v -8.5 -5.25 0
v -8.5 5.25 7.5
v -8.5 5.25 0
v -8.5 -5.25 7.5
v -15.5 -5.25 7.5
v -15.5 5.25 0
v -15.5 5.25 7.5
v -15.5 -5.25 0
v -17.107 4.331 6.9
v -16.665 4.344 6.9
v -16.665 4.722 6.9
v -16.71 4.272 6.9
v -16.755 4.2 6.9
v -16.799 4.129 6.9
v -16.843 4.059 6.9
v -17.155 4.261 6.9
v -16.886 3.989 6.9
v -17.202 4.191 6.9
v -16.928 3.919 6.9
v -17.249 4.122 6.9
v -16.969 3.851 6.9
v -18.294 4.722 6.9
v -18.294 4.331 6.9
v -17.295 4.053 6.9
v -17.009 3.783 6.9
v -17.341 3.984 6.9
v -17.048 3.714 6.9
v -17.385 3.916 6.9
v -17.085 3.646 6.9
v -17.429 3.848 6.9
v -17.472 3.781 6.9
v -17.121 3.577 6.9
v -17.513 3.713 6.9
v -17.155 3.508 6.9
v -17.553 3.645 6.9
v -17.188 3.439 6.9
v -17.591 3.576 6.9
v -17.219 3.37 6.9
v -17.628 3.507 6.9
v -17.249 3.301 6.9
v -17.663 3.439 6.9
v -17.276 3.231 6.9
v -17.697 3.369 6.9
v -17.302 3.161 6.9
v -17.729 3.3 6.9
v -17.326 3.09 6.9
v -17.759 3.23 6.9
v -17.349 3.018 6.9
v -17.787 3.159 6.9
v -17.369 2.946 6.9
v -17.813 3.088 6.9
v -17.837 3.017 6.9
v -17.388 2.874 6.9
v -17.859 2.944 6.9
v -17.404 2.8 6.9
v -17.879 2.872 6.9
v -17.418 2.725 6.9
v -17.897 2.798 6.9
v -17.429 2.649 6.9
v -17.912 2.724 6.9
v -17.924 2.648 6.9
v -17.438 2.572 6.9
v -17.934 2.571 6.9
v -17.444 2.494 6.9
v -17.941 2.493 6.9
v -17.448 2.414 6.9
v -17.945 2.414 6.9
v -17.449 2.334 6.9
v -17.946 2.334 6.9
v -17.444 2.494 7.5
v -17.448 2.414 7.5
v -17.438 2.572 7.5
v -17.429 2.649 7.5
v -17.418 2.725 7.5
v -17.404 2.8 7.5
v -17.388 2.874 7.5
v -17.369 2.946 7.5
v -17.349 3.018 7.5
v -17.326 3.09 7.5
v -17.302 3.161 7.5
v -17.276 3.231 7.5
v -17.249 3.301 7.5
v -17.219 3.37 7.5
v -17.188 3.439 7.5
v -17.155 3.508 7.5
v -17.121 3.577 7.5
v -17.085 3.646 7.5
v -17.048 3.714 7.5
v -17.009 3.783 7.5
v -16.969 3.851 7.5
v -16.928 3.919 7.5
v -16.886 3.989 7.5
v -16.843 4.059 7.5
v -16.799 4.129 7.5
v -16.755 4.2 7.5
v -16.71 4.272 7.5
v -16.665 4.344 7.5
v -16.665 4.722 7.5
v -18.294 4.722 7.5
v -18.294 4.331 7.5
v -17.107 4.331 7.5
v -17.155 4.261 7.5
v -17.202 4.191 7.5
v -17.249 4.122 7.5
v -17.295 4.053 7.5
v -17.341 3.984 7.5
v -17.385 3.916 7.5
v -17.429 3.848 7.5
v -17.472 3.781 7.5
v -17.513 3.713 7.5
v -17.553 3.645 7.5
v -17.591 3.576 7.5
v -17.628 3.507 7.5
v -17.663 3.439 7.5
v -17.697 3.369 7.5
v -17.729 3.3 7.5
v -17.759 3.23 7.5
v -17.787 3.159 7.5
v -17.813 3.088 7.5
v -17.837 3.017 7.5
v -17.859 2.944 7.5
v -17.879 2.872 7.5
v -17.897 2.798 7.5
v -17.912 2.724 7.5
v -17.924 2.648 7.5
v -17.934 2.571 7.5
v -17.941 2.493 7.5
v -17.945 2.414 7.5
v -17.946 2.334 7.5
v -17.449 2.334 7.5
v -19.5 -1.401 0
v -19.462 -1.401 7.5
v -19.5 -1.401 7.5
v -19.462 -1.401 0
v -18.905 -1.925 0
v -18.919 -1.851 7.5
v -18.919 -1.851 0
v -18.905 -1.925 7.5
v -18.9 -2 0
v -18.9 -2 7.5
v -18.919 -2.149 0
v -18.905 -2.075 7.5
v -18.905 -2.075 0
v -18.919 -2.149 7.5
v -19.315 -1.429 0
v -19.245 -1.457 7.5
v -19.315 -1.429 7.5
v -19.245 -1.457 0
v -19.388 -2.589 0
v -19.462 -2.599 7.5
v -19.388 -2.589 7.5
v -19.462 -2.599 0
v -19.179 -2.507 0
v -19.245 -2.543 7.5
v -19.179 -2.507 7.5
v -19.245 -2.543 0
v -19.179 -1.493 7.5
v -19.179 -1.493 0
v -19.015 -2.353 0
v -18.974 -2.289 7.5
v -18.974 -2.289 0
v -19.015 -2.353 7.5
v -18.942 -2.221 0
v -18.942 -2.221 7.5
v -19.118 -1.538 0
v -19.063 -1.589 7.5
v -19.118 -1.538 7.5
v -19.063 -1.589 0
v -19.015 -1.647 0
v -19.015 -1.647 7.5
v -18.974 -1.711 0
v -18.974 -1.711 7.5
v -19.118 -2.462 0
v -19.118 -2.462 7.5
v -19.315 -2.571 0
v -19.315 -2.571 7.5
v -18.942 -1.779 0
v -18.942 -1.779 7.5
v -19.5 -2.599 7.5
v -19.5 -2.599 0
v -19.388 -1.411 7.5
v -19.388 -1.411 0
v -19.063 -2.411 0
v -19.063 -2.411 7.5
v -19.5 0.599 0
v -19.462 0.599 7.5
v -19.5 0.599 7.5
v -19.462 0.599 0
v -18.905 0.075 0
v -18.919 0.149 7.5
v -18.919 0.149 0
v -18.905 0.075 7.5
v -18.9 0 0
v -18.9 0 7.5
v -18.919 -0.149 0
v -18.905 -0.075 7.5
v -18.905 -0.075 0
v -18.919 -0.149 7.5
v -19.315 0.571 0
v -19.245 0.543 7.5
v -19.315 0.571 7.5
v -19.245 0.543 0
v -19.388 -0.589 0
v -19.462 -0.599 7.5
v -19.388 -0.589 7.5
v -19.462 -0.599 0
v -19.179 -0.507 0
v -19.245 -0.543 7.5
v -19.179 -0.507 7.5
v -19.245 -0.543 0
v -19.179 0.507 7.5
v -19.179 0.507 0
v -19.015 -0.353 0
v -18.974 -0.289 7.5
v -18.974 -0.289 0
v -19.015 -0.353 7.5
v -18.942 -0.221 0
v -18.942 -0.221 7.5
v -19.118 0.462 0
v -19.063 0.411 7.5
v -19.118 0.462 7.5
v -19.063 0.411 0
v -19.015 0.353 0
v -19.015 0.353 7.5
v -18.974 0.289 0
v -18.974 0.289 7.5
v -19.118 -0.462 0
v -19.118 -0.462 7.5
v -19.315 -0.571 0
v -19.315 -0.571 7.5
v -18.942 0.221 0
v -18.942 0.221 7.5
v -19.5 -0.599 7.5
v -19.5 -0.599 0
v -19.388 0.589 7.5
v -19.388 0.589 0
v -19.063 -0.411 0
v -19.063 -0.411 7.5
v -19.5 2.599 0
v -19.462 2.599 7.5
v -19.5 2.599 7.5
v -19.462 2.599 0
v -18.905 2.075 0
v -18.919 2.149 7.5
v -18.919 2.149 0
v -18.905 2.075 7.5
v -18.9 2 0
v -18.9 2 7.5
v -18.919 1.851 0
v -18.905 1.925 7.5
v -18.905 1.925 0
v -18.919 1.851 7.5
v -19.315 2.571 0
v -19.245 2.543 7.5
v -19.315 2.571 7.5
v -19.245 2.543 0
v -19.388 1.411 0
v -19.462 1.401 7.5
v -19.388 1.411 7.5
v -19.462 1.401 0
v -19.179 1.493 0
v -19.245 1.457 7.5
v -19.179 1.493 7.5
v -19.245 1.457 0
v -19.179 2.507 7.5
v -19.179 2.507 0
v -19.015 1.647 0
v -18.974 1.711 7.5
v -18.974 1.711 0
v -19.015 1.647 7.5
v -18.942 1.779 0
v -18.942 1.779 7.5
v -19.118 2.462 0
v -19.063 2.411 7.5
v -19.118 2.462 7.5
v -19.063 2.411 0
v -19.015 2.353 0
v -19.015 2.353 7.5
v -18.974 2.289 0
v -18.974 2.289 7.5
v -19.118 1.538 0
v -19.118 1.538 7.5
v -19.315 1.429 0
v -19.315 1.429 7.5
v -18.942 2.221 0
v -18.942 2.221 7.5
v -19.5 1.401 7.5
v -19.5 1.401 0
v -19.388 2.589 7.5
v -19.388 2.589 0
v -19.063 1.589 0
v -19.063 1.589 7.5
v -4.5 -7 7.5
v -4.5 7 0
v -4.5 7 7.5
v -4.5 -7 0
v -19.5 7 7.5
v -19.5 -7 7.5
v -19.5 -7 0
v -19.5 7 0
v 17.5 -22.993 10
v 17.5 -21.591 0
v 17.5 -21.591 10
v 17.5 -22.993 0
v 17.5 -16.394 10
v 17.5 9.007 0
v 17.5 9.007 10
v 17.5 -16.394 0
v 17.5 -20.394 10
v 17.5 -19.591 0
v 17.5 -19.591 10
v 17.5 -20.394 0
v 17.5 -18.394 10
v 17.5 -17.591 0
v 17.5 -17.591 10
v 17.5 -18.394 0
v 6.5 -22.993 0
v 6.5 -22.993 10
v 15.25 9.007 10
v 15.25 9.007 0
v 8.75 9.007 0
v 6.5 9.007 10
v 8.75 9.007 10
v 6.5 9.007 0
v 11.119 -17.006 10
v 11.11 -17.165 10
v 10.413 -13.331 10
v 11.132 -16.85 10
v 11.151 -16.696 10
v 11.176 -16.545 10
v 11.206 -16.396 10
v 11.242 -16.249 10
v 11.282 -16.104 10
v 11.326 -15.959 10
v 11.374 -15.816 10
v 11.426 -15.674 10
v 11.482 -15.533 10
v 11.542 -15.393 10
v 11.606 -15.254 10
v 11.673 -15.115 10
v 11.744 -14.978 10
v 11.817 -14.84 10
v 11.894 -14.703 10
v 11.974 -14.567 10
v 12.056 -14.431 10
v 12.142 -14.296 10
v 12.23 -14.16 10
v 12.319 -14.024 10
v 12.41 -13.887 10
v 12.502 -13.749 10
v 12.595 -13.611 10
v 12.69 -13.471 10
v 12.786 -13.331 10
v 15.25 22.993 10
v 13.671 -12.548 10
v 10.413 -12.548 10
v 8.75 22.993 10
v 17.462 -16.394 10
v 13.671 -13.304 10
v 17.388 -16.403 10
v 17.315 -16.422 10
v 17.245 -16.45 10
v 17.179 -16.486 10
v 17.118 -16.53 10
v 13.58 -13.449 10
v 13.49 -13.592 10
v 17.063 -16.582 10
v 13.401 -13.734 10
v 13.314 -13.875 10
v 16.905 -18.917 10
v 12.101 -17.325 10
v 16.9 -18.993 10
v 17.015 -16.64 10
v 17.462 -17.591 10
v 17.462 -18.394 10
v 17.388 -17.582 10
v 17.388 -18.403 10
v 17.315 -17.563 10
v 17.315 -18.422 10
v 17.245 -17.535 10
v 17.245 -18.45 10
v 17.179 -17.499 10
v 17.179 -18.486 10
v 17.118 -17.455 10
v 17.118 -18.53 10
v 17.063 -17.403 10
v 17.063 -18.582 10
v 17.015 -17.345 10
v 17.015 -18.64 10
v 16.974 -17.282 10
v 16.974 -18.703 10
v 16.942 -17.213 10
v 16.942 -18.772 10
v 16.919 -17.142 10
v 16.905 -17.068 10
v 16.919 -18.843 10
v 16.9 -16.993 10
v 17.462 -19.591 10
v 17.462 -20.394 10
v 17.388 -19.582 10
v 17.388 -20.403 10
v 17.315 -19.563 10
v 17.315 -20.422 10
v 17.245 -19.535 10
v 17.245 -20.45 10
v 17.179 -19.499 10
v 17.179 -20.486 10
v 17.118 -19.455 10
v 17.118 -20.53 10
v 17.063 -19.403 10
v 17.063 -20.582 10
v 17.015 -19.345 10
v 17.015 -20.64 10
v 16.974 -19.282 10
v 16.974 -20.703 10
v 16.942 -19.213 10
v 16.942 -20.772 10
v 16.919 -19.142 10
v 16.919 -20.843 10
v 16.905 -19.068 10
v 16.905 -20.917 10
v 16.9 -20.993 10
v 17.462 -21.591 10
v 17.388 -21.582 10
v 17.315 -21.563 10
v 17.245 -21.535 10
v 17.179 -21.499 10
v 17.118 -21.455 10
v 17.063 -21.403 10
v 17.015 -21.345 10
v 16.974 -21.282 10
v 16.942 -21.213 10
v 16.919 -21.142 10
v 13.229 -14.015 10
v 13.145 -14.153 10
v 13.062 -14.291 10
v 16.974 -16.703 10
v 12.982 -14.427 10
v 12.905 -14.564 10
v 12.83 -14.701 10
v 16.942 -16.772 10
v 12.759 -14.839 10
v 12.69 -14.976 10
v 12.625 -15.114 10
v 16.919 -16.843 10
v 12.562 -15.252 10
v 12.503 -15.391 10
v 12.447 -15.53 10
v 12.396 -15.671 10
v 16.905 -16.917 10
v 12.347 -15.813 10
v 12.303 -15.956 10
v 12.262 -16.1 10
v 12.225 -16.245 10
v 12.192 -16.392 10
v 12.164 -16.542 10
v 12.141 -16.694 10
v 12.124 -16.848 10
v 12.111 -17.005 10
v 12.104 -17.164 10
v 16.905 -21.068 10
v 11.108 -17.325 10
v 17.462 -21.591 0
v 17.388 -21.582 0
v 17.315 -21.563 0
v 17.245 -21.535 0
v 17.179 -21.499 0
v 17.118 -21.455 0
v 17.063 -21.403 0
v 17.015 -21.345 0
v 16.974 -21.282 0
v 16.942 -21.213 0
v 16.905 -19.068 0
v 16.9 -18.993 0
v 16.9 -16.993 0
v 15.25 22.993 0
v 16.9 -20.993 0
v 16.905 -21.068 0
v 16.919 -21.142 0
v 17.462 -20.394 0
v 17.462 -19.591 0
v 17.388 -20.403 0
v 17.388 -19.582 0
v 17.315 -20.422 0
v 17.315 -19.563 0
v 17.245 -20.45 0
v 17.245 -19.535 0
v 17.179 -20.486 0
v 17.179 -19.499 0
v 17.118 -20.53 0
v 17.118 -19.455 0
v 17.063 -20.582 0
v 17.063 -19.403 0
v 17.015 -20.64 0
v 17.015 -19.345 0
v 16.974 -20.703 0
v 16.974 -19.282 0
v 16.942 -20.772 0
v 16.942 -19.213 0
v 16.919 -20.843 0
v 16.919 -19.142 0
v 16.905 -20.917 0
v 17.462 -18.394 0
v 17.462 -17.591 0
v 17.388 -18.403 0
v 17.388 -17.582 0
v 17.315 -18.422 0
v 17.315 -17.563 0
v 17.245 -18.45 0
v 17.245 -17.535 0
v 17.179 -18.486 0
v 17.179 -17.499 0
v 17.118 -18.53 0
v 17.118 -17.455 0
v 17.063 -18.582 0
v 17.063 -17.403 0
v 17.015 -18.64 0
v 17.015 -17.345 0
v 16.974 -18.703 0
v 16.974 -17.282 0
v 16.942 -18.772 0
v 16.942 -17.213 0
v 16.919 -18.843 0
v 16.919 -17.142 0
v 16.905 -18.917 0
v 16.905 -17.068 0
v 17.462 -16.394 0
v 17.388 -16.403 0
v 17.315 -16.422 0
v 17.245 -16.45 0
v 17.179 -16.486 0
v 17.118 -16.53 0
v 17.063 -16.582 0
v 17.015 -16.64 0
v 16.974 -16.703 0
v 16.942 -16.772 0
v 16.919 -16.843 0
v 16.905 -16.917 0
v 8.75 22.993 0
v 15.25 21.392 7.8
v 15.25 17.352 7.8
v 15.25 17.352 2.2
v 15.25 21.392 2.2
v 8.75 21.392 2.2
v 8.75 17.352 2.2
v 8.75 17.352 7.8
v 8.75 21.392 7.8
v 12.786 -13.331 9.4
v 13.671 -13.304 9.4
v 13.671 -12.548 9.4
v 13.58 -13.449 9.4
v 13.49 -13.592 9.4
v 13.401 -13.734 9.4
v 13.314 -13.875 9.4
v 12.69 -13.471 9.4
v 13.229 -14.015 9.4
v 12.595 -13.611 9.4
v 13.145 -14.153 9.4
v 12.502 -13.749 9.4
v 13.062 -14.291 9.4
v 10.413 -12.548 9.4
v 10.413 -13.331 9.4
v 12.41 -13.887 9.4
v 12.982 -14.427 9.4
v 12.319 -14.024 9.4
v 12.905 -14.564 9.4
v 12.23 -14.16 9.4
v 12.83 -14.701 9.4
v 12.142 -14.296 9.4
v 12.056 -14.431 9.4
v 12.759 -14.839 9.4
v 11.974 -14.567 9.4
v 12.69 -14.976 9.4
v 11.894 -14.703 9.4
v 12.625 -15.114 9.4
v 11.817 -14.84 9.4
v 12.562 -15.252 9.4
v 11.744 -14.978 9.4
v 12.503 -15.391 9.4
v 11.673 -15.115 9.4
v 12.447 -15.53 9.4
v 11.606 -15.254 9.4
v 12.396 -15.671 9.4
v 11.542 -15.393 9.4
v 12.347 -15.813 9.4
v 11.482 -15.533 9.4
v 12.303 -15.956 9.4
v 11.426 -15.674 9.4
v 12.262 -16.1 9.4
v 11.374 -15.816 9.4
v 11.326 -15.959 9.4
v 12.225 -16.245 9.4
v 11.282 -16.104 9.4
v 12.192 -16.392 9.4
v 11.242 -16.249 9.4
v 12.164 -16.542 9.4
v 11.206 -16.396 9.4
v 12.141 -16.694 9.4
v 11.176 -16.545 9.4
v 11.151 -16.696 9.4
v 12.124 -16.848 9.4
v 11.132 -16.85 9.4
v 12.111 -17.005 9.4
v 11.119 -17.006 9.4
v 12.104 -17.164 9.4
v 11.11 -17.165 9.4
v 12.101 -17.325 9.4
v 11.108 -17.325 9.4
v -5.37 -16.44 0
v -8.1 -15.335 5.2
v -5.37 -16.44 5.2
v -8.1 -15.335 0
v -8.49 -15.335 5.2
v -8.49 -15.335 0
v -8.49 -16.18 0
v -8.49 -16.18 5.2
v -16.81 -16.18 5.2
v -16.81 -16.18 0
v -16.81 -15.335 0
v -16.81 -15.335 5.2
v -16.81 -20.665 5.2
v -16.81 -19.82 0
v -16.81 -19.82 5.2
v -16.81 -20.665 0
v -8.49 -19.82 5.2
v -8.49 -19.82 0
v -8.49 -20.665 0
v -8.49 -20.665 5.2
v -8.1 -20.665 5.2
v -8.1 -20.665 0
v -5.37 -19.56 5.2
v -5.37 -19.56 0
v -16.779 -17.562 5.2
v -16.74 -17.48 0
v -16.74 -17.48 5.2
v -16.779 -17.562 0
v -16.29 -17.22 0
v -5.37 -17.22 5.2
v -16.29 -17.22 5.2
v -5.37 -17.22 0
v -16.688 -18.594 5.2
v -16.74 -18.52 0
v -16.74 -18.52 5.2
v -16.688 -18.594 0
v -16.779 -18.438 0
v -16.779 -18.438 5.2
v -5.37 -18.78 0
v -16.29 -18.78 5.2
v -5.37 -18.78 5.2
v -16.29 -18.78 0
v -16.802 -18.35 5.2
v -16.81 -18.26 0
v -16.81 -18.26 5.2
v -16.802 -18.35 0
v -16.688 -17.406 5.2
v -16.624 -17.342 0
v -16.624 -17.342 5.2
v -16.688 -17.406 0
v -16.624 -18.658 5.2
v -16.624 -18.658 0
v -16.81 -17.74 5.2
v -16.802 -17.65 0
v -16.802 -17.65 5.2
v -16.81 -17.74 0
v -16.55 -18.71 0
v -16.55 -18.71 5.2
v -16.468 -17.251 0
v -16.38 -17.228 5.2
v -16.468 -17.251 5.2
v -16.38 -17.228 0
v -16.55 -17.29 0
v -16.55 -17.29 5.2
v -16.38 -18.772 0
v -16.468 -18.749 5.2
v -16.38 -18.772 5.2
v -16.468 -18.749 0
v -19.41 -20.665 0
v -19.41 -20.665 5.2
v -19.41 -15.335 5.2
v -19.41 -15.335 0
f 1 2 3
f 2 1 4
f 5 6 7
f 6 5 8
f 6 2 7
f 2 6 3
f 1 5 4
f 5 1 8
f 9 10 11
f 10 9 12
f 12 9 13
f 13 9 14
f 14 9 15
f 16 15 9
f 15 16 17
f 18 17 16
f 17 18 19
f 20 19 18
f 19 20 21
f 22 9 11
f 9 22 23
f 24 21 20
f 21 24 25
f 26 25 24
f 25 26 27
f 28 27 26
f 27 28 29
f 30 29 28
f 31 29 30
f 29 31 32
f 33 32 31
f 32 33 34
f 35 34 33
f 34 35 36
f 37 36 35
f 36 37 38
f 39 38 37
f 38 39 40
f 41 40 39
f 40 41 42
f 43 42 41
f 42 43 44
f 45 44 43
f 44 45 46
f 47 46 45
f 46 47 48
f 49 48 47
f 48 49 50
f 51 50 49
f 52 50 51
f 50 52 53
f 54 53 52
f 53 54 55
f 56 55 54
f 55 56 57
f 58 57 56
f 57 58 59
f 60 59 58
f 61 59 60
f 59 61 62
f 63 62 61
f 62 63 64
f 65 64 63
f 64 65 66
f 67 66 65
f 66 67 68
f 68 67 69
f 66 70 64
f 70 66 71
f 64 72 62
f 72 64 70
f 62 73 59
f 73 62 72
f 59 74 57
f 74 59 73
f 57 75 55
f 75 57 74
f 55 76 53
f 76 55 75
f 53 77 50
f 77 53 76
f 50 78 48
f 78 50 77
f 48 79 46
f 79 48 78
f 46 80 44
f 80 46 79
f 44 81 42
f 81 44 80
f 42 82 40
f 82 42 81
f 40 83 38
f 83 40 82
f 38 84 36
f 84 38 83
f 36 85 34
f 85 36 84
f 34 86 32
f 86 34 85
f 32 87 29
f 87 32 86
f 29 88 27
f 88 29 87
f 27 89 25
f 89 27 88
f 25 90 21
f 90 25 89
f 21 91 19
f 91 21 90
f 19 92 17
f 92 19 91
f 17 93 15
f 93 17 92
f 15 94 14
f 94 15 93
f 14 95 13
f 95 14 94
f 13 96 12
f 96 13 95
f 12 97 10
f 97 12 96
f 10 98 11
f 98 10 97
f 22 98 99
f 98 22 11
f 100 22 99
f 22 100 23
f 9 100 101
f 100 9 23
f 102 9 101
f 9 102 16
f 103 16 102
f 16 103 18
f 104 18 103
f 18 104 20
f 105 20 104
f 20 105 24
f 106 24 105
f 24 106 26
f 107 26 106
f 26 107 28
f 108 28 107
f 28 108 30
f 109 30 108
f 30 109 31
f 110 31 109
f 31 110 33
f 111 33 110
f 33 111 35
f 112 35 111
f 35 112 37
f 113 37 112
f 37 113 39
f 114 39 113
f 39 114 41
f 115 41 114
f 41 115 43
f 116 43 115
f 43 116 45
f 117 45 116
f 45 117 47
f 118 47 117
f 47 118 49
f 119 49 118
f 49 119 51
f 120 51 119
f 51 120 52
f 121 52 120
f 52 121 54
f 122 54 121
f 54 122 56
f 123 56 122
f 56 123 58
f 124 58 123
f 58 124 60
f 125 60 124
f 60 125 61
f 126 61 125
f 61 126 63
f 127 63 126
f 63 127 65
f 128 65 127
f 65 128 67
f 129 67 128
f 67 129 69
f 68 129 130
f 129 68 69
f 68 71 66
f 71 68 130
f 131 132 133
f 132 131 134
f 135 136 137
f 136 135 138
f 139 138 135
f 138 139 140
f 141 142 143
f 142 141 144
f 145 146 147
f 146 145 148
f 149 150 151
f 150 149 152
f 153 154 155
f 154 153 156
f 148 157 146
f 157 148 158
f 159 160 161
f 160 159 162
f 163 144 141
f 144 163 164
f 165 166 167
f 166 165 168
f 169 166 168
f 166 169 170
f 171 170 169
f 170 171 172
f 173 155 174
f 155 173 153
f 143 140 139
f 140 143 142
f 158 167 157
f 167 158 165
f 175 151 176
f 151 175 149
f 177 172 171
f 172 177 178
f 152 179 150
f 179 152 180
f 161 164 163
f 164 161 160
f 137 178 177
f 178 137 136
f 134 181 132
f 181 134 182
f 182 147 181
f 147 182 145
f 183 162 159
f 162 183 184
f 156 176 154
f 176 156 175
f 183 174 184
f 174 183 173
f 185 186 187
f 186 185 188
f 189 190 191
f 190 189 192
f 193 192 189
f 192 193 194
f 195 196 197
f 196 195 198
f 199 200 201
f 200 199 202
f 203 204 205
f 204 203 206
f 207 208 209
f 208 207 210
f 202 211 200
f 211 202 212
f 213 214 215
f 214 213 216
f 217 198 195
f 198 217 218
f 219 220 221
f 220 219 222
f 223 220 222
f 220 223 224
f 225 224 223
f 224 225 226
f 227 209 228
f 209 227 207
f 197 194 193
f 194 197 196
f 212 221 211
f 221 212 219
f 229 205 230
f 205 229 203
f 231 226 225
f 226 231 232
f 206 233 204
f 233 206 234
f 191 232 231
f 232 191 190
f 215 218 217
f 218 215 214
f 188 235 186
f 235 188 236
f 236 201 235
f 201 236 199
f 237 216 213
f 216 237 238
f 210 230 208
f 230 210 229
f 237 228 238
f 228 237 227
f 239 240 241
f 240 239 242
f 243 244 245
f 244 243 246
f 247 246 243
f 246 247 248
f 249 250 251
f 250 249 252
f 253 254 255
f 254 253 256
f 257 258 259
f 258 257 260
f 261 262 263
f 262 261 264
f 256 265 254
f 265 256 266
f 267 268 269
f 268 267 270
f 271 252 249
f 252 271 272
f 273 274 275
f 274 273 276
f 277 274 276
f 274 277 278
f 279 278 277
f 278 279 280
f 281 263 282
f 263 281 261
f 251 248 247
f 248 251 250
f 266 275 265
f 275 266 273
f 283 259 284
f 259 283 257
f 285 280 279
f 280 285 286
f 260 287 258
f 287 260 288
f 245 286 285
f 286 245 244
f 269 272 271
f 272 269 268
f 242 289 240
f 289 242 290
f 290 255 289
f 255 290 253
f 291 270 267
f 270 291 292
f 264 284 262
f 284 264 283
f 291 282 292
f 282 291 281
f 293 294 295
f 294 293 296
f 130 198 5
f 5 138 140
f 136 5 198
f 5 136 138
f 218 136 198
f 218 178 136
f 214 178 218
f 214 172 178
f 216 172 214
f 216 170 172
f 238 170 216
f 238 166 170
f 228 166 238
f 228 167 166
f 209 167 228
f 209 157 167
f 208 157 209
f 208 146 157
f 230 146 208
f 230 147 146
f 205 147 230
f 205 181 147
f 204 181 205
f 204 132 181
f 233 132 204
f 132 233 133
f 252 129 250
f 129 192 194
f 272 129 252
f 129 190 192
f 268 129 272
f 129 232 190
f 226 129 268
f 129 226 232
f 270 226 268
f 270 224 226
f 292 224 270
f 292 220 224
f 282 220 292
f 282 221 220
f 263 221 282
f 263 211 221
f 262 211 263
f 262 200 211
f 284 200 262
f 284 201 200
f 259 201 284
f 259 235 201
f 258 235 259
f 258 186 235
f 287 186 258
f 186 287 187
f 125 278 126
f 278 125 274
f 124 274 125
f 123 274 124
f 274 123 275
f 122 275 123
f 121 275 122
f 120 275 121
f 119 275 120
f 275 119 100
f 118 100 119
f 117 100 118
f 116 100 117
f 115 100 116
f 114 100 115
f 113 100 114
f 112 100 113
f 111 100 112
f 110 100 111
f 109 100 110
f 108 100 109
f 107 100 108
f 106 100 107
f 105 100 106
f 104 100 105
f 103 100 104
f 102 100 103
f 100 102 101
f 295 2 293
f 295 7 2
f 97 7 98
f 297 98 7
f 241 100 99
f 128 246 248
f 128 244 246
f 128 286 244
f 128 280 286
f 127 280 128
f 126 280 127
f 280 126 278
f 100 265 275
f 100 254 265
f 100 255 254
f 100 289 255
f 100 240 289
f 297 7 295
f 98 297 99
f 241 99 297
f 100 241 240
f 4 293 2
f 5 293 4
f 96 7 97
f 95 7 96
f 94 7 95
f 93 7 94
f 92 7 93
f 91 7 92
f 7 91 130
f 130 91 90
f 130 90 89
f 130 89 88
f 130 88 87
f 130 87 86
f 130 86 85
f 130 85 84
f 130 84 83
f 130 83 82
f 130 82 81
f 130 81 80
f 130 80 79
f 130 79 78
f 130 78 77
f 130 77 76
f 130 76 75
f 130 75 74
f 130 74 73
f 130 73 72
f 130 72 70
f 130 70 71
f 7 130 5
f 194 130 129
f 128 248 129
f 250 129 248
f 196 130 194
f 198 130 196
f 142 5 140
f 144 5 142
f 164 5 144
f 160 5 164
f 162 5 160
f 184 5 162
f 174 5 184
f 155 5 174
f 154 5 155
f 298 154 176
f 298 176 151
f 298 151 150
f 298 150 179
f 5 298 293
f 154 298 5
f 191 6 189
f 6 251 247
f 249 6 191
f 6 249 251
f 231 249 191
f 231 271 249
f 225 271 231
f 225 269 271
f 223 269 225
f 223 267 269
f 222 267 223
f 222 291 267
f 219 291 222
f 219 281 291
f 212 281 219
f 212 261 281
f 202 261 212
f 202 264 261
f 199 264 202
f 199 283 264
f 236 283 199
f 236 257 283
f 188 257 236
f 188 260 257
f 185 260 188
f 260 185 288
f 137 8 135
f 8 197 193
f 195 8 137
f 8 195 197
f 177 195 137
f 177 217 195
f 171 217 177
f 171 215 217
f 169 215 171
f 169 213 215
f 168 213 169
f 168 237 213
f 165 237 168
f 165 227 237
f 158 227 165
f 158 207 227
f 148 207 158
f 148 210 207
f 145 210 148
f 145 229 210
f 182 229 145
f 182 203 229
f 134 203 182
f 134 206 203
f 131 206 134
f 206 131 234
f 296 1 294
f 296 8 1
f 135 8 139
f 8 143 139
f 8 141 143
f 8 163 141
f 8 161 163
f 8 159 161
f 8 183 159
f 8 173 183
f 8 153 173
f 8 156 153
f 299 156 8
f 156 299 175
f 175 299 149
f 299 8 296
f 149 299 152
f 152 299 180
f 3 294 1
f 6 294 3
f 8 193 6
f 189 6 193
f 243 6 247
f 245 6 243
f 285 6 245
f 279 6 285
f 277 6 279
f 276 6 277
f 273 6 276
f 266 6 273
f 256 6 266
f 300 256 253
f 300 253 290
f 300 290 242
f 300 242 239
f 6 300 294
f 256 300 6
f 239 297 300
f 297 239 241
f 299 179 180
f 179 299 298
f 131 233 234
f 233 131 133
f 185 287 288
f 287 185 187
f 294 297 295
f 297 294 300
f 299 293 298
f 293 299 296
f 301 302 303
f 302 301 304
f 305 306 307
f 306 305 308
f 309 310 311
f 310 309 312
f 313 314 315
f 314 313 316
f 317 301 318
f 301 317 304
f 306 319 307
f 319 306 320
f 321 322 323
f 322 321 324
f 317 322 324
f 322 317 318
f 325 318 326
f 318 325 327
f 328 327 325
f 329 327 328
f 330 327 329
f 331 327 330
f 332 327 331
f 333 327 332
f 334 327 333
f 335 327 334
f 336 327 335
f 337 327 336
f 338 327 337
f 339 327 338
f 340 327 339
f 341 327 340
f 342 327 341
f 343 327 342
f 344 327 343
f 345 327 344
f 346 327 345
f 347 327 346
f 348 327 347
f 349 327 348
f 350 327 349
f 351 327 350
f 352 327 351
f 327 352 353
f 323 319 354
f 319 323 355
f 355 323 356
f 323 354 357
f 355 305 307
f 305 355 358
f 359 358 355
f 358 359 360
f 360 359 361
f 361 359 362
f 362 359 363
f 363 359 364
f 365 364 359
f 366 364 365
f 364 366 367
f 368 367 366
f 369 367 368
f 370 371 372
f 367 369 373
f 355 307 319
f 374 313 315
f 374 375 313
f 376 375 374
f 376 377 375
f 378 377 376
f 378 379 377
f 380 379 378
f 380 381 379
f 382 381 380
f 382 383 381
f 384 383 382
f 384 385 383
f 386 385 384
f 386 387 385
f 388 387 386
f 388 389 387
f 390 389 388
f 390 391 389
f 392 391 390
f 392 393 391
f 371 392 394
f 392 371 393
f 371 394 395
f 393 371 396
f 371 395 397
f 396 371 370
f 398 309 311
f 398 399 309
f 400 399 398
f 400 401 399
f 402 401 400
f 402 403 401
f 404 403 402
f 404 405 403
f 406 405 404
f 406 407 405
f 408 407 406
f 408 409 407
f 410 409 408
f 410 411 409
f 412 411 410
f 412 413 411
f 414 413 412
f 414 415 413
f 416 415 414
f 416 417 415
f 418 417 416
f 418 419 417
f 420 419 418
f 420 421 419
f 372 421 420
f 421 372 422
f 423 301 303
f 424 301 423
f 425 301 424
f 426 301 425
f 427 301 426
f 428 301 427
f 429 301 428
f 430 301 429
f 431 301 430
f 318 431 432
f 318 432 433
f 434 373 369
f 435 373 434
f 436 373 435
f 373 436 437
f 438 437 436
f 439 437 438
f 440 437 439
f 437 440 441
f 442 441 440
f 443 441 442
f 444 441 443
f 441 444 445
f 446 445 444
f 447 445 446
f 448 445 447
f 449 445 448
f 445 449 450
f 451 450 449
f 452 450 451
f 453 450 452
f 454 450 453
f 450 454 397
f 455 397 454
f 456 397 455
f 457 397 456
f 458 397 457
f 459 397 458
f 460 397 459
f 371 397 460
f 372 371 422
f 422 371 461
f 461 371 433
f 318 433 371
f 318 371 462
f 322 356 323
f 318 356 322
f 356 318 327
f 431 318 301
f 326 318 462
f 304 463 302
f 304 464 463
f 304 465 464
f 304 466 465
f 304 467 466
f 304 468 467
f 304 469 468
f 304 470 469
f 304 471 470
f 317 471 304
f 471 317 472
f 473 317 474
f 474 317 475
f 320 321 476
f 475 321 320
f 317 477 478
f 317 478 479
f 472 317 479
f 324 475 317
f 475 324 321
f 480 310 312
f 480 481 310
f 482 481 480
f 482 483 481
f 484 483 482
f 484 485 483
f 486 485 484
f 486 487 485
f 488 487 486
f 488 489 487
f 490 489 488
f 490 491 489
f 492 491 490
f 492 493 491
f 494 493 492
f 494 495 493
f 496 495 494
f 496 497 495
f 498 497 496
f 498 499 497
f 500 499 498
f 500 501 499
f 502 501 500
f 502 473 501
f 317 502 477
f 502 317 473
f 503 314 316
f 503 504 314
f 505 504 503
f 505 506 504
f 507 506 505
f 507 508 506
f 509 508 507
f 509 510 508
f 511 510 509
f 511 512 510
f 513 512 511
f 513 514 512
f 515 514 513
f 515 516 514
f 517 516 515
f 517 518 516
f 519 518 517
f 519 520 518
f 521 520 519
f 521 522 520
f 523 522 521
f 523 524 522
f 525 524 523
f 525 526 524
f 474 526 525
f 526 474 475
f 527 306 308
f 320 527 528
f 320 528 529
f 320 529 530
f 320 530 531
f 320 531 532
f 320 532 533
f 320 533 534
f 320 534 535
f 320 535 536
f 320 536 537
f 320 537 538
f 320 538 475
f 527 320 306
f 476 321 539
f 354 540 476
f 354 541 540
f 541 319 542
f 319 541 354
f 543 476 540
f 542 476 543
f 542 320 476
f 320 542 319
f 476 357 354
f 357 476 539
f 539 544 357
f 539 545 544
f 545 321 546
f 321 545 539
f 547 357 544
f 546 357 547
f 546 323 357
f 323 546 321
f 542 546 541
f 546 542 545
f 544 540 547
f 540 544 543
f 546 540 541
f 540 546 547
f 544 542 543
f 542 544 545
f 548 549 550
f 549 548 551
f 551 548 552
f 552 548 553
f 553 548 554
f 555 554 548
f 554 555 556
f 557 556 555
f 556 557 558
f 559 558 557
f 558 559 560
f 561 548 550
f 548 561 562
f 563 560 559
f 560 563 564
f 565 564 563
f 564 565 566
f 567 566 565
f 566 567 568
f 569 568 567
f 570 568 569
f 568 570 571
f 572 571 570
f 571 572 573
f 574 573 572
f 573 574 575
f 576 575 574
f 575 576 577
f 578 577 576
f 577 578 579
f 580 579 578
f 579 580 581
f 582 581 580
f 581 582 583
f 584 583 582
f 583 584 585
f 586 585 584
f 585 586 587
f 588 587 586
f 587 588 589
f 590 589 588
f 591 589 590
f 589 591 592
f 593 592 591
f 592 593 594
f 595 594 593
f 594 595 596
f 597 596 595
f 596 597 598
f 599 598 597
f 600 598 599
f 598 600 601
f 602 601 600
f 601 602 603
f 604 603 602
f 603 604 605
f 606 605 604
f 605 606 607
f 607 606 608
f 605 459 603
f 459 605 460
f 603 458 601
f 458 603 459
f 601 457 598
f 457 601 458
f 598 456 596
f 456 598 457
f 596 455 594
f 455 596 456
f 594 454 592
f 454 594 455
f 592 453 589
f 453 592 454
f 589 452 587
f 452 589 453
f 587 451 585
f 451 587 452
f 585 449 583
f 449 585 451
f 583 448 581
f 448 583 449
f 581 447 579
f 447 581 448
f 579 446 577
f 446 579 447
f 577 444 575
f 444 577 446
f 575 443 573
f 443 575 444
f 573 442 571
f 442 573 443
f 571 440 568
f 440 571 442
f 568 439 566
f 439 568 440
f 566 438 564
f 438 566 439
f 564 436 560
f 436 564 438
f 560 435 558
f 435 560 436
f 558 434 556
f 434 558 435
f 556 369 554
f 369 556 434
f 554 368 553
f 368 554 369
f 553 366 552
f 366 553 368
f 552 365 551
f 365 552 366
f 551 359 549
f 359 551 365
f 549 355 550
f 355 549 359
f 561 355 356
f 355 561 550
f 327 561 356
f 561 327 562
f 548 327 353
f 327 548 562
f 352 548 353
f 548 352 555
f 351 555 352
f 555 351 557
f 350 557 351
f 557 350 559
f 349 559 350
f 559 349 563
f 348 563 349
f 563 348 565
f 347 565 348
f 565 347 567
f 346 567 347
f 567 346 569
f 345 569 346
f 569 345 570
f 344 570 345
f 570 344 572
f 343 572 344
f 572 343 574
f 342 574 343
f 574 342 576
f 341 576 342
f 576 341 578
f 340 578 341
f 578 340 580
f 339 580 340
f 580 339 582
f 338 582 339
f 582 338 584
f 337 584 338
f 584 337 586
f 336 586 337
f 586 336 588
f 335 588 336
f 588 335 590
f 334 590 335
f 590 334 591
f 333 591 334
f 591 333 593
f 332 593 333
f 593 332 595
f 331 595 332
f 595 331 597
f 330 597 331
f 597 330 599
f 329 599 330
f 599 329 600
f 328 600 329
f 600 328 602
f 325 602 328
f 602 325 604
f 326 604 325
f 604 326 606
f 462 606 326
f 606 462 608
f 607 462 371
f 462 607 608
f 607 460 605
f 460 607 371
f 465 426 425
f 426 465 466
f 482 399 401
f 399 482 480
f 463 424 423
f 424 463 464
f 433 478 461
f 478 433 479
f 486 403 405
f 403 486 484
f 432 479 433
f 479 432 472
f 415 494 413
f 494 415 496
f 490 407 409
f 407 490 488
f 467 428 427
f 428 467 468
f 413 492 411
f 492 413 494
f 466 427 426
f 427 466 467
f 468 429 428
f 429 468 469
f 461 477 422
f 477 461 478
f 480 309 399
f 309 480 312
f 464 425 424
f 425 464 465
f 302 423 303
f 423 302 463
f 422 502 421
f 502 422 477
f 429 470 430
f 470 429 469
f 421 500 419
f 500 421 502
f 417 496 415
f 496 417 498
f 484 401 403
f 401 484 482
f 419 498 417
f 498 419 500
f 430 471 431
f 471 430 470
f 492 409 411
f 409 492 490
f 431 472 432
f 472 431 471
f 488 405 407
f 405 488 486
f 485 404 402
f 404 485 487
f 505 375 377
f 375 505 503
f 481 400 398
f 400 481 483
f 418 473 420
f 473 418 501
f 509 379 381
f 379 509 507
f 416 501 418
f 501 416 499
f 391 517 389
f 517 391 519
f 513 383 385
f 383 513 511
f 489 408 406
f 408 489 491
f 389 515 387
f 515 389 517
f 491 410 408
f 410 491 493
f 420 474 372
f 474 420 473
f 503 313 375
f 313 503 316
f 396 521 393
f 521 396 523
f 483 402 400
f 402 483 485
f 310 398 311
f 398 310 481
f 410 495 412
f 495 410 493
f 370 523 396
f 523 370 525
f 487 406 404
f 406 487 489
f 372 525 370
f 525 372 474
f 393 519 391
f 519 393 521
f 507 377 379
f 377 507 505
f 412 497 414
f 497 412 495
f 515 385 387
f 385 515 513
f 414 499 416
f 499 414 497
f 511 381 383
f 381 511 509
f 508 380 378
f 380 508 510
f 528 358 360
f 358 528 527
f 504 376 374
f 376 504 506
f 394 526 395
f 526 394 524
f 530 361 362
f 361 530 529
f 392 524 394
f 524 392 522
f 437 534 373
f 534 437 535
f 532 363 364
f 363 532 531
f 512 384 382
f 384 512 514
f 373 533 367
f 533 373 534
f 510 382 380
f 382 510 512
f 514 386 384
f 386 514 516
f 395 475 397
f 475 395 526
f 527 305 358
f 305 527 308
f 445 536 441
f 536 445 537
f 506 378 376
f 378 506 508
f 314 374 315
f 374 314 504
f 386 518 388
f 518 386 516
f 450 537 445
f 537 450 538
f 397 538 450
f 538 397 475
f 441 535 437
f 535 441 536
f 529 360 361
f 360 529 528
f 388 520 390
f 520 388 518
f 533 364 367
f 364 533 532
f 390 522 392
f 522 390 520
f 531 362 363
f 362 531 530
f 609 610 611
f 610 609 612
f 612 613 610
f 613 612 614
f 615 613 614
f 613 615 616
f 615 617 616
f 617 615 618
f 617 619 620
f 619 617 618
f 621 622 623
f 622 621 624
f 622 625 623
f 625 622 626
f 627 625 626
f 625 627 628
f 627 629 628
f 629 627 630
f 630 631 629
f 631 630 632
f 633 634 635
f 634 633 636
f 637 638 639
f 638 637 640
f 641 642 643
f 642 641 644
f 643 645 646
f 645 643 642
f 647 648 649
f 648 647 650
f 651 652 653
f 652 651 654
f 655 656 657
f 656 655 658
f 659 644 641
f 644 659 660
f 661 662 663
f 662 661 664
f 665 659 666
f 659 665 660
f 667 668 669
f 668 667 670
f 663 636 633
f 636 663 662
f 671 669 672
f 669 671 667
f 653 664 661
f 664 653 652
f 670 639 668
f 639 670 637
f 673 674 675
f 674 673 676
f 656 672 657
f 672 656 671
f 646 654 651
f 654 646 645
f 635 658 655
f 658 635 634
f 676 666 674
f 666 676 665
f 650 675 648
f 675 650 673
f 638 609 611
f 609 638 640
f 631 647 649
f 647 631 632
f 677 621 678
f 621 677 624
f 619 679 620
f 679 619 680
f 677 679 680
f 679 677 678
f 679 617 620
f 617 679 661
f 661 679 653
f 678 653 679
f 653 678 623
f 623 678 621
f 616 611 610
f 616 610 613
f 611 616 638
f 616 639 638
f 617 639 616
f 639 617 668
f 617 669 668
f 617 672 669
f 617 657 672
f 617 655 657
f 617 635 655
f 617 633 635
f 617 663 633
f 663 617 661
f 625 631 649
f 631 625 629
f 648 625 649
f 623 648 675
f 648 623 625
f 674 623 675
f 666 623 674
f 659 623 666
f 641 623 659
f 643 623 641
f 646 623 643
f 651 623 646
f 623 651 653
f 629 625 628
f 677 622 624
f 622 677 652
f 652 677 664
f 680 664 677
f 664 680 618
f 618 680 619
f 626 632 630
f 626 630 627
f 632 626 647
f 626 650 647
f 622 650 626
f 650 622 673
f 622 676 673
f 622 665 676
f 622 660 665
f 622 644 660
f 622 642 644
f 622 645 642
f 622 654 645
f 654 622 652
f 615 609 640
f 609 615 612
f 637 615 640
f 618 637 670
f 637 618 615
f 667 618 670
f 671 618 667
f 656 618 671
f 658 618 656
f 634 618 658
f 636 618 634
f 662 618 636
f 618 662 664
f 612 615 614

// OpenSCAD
$fn = 50;

difference() {
	union() {
		translate(v = [-12, -5, 0]) {
			rotate(a = [0, 0, 0]) {
				difference() {
					union() {
						translate(v = [-7.5, -2.0, 0]) {
							cube(size = [15.0, 14.0, 7.5]);
						}
					}
					union() {
						translate(v = [-3.5, -0.25, -0.1]) {
							cube(size = [7.0, 10.5, 7.7]);
						}
						translate(v = [-5.5, 8.5, 6.9]) {
							linear_extrude(height = 0.7) {
								text(font = "Arial:style=Bold", halign = "center", size = 2.5, text = "7", valign = "center");
							}
						}
						translate(v = [-7.5, 3, -0.1]) {
							cylinder(h = 7.7, r = 0.6);
						}
						translate(v = [-7.5, 5, -0.1]) {
							cylinder(h = 7.7, r = 0.6);
						}
						translate(v = [-7.5, 7, -0.1]) {
							cylinder(h = 7.7, r = 0.6);
						}
					}
				}
			}
		}
		translate(v = [12, 9.0075, 0]) {
			rotate(a = [90, 0, 0]) {
				difference() {
					union() {
						translate(v = [-5.5, 0, 0]) {
							cube(size = [11.0, 10.0, 32.0]);
						}
						translate(v = [-3.25, 0, -13.985]) {
							cube(size = [6.5, 10.0, 14.084999999999999]);
						}
					}
					union() {
						translate(v = [-3.35, 2.1999999999999997, -12.385]) {
							cube(size = [6.7, 5.6000000000000005, 4.04]);
						}
						translate(v = [0, 9.4, 24.0]) {
							rotate(a = [-90, 0, 0]) {
								linear_extrude(height = 0.7) {
									text(font = "Arial:style=Bold", halign = "center", size = 5.0, text = "7", valign = "center");
								}
							}
						}
						translate(v = [5.5, 10.1, 30.0]) {
							rotate(a = [90, 0, 0]) {
								cylinder(h = 10.2, r = 0.6);
							}
						}
						translate(v = [5.5, 10.1, 28.0]) {
							rotate(a = [90, 0, 0]) {
								cylinder(h = 10.2, r = 0.6);
							}
						}
						translate(v = [5.5, 10.1, 26.0]) {
							rotate(a = [90, 0, 0]) {
								cylinder(h = 10.2, r = 0.6);
							}
						}
					}
				}
			}
		}
		translate(v = [-12, -18, 0]) {
			rotate(a = [90, 0, 0]) {
				difference() {
					union() {
						translate(v = [-7.41, 0, -2.665]) {
							cube(size = [14.04, 5.2, 5.33]);
						}
					}
					union() {
						translate(v = [0, 5.3, 0]) {
							rotate(a = [90, 0, 0]) {
								linear_extrude(height = 5.4) {
									polygon(points = [[-4.81, -1.82], [3.51, -1.82], [3.51, -2.665], [3.9, -2.665], [6.63, -1.56], [6.73, -1.56], [6.73, -2.765], [-4.81, -2.765]]);
								}
							}
						}
						translate(v = [0, 5.3, 0]) {
							rotate(a = [90, 0, 0]) {
								linear_extrude(height = 5.4) {
									polygon(points = [[-4.81, 1.82], [3.51, 1.82], [3.51, 2.665], [3.9, 2.665], [6.63, 1.56], [6.73, 1.56], [6.73, 2.765], [-4.81, 2.765]]);
								}
							}
						}
						translate(v = [0, 5.3, 0]) {
							rotate(a = [90, 0, 0]) {
								linear_extrude(height = 5.4) {
									polygon(points = [[-4.81, 0.26], [-4.8021, 0.350297], [-4.77864, 0.43785], [-4.740333, 0.52], [-4.688343, 0.59425], [-4.62425, 0.658343], [-4.55, 0.710333], [-4.46785, 0.74864], [-4.380297, 0.7721], [-4.29, 0.78], [6.73, 0.78], [6.73, -0.78], [-4.29, -0.78], [-4.380297, -0.7721], [-4.46785, -0.74864], [-4.55, -0.710333], [-4.62425, -0.658343], [-4.688343, -0.59425], [-4.740333, -0.52], [-4.77864, -0.43785], [-4.8021, -0.350297], [-4.81, -0.26]]);
								}
							}
						}
					}
				}
			}
		}
	}
	union();
}
